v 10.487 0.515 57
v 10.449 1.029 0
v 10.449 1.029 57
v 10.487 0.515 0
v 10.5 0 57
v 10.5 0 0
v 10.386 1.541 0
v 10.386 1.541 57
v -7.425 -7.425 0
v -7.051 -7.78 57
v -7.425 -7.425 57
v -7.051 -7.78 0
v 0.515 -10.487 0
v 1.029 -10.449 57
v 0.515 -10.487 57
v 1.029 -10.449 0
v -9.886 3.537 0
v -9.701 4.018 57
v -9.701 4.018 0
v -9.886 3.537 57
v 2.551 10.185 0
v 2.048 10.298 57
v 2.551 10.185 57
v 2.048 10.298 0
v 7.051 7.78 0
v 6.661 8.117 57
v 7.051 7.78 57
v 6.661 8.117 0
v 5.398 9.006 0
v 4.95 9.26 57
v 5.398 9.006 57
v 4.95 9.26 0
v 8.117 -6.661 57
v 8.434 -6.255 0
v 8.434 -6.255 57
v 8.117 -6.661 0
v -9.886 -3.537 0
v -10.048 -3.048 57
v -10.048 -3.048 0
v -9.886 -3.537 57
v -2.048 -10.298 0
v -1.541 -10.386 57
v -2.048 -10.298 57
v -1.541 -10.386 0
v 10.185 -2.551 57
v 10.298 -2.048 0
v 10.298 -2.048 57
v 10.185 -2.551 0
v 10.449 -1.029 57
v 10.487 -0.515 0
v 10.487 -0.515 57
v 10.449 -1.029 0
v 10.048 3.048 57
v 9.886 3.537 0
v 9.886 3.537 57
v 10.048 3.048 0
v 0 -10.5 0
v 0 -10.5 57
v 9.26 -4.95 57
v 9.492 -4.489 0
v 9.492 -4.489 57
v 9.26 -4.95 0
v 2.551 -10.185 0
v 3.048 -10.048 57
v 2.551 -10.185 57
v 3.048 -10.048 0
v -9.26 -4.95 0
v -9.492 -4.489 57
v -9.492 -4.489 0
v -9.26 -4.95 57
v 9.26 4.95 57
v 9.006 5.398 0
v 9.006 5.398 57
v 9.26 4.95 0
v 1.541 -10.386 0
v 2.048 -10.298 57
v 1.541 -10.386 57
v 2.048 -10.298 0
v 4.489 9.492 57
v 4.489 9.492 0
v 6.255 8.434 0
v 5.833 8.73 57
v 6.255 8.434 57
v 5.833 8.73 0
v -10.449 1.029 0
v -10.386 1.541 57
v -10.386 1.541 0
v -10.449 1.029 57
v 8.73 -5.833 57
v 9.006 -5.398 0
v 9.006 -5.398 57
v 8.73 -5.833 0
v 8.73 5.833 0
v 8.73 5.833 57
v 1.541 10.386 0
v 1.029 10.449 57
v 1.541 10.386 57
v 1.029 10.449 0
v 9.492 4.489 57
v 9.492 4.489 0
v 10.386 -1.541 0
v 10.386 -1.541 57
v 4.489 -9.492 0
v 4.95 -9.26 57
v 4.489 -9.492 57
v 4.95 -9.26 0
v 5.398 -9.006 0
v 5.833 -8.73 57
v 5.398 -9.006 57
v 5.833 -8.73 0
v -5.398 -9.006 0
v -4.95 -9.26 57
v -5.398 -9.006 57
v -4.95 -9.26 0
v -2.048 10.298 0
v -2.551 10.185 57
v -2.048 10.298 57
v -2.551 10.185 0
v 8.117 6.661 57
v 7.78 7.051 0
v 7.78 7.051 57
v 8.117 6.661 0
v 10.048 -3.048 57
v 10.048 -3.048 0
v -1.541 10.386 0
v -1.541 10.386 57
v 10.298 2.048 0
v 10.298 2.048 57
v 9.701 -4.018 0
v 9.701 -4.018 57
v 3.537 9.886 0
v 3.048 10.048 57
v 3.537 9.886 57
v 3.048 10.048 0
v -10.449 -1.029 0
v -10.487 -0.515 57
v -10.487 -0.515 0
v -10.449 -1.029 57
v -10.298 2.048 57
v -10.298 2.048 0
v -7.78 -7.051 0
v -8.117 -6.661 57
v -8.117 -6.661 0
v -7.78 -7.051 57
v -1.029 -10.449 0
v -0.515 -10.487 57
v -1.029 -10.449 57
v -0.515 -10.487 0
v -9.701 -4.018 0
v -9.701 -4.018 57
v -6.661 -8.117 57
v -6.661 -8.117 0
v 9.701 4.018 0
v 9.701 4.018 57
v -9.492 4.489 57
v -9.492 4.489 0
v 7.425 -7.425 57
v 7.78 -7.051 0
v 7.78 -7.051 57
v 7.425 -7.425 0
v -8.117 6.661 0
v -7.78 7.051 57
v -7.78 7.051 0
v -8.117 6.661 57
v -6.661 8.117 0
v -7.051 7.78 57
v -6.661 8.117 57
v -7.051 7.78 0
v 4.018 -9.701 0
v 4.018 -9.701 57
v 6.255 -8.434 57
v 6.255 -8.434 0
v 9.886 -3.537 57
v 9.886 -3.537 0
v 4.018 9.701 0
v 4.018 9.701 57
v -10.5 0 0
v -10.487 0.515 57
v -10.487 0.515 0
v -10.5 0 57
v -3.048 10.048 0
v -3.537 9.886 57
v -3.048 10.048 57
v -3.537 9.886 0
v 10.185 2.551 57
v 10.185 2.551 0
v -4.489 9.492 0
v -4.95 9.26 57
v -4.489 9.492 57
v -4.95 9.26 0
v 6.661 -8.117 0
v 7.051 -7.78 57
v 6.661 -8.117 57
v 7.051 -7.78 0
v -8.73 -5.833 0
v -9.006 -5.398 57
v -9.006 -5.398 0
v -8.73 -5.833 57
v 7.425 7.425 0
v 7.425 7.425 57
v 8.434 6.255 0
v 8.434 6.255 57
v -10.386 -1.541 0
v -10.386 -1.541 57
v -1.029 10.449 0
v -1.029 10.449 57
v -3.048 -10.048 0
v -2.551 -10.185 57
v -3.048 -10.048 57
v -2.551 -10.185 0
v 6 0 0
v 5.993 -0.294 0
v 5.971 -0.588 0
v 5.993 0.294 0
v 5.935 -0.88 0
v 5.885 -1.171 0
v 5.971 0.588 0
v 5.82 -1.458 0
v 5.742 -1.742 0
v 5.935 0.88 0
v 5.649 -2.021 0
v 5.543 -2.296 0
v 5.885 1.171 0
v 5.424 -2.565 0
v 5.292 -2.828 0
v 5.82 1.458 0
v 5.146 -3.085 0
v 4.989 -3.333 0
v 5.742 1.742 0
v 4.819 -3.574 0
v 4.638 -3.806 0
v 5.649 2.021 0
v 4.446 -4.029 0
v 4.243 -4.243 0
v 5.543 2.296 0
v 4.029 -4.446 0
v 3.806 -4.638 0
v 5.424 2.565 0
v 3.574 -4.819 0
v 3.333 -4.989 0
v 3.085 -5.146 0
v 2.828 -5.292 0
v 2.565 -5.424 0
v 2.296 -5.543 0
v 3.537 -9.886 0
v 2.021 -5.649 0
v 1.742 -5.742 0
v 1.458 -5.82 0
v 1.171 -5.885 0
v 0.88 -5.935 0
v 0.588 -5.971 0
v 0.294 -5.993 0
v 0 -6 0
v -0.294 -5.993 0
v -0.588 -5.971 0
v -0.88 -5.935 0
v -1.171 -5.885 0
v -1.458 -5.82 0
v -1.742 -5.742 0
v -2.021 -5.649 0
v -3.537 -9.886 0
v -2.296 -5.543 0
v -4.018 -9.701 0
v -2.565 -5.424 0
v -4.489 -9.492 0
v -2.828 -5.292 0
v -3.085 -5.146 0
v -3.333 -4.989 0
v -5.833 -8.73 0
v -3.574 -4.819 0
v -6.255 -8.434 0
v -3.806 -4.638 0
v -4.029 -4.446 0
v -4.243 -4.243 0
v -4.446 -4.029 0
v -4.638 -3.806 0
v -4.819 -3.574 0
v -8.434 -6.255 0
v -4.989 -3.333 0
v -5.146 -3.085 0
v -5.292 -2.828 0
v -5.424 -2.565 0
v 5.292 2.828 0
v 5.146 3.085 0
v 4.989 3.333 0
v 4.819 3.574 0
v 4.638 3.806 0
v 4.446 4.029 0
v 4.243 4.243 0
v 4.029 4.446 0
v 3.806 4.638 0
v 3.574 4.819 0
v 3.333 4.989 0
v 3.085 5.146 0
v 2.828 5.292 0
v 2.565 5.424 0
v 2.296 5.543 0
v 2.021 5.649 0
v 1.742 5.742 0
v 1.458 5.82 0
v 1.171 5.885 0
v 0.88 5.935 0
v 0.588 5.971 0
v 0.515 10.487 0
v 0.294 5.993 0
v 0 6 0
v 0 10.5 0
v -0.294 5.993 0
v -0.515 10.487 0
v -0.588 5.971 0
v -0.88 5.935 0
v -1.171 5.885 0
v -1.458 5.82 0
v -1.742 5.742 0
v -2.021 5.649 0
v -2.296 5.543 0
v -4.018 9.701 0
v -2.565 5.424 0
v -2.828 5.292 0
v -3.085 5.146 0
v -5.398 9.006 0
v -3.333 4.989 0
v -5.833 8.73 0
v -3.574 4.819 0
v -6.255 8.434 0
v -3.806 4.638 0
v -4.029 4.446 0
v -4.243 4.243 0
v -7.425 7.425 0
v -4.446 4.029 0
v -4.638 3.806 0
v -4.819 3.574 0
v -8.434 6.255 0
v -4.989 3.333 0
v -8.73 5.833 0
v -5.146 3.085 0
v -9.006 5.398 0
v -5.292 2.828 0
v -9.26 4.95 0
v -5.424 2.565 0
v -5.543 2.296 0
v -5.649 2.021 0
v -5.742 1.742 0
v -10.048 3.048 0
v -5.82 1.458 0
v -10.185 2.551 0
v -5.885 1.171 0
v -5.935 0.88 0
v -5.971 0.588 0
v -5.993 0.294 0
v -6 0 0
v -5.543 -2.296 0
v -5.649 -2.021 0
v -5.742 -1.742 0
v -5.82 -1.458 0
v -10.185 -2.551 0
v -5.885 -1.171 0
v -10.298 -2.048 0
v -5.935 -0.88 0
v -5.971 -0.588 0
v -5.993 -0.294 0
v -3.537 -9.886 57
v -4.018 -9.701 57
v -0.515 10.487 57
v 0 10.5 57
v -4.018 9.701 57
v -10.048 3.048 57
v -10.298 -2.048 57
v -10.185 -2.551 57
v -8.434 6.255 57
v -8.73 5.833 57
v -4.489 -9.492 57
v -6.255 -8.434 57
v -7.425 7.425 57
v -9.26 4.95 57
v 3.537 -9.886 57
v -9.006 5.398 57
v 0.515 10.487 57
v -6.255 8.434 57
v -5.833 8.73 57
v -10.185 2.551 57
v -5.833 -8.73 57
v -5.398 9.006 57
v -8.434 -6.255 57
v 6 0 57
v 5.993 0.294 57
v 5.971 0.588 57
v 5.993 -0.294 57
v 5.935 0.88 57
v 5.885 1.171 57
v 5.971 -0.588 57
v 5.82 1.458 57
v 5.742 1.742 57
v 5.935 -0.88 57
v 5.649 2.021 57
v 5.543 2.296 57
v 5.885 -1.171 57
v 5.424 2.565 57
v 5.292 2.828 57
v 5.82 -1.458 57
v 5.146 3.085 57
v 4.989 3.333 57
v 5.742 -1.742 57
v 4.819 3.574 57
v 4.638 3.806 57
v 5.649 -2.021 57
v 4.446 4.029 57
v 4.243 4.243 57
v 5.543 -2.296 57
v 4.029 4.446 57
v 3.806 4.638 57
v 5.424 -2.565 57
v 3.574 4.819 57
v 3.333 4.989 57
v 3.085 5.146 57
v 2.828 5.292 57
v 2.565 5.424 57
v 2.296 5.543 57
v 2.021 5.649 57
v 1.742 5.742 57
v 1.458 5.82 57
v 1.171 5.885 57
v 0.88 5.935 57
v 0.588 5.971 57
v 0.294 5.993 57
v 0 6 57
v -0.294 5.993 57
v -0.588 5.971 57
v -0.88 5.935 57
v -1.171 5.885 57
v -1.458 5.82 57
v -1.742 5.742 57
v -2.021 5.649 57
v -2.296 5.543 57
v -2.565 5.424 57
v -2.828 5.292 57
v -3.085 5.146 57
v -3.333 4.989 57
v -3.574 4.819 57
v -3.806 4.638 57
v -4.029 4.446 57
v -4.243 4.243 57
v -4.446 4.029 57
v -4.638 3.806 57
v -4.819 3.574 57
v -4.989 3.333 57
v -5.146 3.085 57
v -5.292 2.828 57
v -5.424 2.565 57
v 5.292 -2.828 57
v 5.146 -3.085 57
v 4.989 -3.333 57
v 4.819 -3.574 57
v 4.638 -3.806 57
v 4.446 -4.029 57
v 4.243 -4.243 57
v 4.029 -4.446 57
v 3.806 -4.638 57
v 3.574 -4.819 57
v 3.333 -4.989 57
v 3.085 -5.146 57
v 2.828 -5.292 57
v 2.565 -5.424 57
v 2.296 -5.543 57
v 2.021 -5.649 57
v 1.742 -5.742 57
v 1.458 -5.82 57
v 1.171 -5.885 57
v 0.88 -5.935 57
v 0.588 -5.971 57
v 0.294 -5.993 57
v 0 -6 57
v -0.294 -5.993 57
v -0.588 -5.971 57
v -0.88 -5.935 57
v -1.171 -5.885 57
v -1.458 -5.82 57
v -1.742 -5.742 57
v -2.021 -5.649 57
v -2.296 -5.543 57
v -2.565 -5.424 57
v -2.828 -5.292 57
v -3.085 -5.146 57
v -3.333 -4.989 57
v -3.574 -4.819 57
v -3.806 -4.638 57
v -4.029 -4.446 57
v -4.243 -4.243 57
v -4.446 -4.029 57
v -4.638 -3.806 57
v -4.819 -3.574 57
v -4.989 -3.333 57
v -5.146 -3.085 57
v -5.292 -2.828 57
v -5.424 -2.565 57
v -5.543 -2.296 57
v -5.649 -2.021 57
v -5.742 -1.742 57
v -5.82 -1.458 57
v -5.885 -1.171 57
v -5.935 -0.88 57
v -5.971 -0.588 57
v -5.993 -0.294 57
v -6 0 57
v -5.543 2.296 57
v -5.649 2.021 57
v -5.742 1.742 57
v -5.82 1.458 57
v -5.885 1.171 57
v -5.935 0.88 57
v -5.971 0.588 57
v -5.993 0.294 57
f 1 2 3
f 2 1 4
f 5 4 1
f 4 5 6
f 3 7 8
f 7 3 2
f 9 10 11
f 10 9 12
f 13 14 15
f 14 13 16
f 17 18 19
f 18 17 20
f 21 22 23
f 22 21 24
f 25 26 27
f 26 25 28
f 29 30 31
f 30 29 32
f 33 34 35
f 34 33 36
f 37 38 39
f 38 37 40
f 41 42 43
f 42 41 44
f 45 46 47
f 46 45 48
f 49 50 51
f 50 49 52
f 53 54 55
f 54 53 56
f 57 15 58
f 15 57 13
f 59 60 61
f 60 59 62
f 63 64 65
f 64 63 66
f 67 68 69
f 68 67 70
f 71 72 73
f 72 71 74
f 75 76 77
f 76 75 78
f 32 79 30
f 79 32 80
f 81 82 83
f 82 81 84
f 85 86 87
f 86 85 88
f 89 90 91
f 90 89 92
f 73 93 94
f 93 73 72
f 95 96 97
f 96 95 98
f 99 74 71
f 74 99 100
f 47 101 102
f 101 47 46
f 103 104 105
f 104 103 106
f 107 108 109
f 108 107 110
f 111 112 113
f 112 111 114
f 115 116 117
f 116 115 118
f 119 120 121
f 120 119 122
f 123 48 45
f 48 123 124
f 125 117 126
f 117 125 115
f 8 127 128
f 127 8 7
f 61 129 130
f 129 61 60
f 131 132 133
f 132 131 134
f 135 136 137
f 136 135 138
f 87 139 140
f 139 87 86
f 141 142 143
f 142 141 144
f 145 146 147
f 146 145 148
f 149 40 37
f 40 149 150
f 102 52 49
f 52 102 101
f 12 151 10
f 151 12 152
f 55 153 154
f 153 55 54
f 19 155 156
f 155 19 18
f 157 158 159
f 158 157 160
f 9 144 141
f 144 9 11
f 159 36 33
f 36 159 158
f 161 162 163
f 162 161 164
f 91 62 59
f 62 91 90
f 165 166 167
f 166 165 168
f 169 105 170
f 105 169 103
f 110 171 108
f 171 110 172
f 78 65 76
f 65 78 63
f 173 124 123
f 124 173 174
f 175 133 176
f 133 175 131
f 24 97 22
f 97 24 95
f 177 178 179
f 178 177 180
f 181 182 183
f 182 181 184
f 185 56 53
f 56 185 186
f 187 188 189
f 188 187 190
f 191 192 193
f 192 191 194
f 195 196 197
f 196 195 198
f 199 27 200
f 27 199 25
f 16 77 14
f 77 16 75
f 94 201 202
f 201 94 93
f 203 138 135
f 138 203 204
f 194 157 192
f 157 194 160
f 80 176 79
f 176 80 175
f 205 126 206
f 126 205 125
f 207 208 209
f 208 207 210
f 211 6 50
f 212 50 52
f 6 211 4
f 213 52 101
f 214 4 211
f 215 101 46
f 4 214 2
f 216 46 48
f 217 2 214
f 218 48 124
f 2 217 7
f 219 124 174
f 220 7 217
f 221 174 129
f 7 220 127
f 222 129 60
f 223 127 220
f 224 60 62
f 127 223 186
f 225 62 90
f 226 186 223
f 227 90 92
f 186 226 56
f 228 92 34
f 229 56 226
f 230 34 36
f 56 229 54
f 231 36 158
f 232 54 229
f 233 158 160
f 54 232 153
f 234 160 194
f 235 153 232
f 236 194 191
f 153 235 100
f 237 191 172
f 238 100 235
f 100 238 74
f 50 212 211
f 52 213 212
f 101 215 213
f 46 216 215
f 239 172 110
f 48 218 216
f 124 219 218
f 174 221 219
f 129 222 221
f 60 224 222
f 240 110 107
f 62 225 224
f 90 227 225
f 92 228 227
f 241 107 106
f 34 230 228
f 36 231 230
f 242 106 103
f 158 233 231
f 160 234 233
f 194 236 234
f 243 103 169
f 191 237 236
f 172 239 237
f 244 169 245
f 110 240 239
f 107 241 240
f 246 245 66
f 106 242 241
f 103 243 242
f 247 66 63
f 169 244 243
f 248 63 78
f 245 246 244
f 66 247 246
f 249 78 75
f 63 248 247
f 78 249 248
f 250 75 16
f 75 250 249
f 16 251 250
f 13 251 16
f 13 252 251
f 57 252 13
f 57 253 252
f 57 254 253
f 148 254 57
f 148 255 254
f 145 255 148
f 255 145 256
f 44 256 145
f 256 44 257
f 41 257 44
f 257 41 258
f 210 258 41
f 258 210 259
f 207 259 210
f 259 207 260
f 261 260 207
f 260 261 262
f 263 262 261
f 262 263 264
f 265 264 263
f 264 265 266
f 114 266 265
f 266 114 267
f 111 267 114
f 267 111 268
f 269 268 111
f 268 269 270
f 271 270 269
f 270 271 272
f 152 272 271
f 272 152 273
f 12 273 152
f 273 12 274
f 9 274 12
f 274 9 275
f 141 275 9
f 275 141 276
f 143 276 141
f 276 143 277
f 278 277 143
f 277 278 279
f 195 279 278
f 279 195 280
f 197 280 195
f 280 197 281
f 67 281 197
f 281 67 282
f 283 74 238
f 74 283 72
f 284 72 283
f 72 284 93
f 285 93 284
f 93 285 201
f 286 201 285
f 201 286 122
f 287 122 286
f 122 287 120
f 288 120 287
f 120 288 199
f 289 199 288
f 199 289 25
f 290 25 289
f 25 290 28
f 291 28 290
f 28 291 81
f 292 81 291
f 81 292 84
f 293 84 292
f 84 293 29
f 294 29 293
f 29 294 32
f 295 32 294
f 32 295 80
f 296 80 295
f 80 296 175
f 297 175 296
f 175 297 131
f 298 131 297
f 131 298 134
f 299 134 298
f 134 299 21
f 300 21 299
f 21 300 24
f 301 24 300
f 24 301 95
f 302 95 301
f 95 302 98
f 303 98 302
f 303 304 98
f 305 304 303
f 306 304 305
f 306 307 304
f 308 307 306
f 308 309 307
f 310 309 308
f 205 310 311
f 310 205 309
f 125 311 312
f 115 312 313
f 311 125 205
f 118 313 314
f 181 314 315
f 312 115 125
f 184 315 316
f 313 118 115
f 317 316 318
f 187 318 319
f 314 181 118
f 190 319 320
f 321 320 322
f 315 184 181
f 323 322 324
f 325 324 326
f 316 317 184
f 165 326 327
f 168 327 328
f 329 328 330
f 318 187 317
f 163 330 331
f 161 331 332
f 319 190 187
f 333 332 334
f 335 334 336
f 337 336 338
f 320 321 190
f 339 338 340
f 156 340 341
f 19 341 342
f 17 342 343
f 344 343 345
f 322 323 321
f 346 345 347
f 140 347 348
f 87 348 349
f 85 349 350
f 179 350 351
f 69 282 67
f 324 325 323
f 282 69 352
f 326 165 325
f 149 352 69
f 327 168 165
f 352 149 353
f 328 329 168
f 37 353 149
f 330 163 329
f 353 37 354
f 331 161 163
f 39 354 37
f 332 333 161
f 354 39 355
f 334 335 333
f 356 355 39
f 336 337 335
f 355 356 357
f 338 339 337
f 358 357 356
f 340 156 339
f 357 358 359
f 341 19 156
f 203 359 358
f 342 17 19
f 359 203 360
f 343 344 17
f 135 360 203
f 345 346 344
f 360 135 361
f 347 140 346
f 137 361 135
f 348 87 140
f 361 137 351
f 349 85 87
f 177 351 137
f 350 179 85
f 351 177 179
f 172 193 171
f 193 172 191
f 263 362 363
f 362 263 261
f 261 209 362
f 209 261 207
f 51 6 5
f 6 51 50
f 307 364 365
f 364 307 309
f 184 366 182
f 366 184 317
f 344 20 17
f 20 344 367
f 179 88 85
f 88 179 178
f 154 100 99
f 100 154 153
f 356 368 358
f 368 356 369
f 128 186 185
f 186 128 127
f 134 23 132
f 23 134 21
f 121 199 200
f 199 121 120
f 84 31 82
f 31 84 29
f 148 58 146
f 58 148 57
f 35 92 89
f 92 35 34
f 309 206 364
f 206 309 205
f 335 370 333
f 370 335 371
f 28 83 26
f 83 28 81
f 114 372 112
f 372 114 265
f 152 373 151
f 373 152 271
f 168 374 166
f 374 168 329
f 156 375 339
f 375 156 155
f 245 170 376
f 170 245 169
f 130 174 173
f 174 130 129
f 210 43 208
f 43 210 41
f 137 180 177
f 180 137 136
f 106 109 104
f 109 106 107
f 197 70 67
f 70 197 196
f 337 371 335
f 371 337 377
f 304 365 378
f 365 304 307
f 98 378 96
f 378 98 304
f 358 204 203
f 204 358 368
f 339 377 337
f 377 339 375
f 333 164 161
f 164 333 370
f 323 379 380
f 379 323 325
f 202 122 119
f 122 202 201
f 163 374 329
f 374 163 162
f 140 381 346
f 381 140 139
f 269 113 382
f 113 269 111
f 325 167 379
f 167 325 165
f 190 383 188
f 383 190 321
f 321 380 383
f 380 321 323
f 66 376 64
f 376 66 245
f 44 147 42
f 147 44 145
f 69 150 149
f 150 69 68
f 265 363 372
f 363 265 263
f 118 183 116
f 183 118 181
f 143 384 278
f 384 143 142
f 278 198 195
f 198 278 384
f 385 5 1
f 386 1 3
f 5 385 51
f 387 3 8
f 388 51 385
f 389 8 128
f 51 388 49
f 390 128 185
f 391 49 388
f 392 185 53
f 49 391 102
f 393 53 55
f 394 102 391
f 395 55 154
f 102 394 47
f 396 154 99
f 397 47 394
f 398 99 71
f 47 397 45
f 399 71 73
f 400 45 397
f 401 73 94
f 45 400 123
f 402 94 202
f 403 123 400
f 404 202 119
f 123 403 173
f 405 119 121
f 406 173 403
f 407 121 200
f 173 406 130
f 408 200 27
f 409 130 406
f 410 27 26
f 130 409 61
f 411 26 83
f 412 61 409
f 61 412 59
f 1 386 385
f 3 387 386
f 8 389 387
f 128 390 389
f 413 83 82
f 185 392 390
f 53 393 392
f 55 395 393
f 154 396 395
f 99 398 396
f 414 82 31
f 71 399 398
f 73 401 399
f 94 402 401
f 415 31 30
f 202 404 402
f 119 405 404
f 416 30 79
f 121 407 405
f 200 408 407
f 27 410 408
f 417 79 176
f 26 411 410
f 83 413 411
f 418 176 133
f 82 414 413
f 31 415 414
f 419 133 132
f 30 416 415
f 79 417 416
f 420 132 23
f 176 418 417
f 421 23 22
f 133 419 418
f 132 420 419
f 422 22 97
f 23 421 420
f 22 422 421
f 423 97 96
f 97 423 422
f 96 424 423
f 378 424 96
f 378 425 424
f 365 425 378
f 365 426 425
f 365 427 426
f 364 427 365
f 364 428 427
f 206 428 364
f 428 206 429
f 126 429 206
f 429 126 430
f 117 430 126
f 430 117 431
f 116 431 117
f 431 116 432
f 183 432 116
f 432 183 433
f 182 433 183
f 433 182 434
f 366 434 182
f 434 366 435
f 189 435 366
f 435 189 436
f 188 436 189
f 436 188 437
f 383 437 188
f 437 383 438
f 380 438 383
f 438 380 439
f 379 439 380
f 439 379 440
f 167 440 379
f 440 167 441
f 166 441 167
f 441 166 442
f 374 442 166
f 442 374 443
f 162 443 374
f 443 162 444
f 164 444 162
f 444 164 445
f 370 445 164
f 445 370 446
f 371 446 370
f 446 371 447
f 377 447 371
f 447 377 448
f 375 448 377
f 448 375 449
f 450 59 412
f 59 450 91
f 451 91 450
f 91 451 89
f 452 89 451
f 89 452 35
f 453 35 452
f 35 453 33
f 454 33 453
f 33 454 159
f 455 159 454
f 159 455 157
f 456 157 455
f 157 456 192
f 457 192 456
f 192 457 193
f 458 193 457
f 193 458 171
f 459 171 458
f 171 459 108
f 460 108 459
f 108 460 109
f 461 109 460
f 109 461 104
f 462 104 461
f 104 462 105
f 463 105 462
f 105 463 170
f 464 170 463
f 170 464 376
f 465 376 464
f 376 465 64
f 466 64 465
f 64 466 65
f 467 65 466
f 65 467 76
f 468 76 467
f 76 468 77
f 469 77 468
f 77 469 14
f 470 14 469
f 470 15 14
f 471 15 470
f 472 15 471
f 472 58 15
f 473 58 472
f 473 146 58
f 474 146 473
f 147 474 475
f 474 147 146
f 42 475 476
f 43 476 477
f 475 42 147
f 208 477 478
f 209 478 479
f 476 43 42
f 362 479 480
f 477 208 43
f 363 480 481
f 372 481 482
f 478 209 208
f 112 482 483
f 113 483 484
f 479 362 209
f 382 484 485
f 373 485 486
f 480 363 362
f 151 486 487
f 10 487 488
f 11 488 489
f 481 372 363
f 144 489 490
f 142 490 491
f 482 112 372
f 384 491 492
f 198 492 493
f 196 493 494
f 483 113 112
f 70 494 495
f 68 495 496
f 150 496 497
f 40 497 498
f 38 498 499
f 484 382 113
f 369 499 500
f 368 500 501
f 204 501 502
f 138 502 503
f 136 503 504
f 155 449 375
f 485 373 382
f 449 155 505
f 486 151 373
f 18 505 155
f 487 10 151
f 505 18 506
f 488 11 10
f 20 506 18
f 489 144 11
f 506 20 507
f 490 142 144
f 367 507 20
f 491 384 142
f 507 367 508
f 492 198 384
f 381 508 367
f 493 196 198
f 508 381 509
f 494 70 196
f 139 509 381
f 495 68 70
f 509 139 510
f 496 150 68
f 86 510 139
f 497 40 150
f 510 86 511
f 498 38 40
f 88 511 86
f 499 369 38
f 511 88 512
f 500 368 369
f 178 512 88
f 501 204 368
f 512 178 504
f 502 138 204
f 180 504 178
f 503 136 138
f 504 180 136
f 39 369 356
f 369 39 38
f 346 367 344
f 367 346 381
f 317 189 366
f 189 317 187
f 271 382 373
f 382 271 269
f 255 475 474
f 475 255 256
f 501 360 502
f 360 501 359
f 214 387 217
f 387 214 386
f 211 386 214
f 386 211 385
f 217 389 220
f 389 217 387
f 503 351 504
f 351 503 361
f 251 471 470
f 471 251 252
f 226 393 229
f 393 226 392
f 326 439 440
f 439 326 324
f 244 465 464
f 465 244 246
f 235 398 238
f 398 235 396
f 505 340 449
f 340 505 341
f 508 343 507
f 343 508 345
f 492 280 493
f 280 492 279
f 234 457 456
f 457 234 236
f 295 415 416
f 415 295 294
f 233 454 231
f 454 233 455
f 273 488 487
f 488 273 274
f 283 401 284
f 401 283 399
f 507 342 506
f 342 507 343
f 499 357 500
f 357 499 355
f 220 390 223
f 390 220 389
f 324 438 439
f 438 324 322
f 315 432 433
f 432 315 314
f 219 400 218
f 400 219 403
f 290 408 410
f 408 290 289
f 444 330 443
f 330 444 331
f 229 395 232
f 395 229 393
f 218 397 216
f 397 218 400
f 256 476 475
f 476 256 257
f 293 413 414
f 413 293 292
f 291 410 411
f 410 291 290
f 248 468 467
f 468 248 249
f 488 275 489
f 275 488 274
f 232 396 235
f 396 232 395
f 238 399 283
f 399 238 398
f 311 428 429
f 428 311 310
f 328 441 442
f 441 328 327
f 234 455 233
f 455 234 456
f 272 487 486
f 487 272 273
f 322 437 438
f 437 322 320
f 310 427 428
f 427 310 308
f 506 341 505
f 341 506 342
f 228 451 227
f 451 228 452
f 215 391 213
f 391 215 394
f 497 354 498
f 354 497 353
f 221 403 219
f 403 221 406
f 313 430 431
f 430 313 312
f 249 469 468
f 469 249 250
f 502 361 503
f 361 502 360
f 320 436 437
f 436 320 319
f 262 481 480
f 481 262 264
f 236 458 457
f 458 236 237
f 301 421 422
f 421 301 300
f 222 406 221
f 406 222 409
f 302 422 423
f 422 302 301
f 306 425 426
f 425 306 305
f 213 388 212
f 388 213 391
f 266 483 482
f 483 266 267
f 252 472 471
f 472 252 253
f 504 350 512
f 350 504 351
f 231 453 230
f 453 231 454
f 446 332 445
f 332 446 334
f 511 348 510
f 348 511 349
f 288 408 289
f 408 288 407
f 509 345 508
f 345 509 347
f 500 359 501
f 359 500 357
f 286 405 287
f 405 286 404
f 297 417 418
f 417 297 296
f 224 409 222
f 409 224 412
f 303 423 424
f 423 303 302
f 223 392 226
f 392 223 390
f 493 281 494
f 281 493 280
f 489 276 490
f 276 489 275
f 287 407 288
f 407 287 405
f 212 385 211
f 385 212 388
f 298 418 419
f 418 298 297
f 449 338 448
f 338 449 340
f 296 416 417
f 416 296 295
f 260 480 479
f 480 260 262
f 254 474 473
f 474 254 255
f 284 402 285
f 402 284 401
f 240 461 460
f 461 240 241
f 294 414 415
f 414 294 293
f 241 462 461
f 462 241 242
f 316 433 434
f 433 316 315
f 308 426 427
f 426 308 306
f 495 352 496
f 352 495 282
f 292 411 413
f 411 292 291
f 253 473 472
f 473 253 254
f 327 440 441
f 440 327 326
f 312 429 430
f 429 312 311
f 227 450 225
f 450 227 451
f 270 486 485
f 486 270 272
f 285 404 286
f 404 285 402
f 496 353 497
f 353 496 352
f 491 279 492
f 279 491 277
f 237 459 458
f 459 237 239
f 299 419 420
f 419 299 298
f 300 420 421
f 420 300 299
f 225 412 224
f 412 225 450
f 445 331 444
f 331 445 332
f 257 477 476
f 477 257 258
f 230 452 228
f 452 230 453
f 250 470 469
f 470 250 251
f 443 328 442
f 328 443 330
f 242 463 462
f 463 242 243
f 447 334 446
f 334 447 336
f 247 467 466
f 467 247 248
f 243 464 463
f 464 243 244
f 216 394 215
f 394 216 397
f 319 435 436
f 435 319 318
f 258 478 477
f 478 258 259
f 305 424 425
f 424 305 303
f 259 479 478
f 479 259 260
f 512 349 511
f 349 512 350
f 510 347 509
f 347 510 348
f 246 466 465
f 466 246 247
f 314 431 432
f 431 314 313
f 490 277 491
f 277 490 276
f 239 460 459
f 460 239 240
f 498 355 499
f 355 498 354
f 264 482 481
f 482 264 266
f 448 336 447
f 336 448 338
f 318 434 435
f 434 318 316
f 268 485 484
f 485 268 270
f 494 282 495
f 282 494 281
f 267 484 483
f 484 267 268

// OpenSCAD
$fn = 128;

bore_d = 12.0;
od_d   = 21.0;
len    = 57.0;

difference() {
  cylinder(d = od_d, h = len, center = false);
  translate([0,0,-0.1])
    cylinder(d = bore_d, h = len + 0.2, center = false);
}
